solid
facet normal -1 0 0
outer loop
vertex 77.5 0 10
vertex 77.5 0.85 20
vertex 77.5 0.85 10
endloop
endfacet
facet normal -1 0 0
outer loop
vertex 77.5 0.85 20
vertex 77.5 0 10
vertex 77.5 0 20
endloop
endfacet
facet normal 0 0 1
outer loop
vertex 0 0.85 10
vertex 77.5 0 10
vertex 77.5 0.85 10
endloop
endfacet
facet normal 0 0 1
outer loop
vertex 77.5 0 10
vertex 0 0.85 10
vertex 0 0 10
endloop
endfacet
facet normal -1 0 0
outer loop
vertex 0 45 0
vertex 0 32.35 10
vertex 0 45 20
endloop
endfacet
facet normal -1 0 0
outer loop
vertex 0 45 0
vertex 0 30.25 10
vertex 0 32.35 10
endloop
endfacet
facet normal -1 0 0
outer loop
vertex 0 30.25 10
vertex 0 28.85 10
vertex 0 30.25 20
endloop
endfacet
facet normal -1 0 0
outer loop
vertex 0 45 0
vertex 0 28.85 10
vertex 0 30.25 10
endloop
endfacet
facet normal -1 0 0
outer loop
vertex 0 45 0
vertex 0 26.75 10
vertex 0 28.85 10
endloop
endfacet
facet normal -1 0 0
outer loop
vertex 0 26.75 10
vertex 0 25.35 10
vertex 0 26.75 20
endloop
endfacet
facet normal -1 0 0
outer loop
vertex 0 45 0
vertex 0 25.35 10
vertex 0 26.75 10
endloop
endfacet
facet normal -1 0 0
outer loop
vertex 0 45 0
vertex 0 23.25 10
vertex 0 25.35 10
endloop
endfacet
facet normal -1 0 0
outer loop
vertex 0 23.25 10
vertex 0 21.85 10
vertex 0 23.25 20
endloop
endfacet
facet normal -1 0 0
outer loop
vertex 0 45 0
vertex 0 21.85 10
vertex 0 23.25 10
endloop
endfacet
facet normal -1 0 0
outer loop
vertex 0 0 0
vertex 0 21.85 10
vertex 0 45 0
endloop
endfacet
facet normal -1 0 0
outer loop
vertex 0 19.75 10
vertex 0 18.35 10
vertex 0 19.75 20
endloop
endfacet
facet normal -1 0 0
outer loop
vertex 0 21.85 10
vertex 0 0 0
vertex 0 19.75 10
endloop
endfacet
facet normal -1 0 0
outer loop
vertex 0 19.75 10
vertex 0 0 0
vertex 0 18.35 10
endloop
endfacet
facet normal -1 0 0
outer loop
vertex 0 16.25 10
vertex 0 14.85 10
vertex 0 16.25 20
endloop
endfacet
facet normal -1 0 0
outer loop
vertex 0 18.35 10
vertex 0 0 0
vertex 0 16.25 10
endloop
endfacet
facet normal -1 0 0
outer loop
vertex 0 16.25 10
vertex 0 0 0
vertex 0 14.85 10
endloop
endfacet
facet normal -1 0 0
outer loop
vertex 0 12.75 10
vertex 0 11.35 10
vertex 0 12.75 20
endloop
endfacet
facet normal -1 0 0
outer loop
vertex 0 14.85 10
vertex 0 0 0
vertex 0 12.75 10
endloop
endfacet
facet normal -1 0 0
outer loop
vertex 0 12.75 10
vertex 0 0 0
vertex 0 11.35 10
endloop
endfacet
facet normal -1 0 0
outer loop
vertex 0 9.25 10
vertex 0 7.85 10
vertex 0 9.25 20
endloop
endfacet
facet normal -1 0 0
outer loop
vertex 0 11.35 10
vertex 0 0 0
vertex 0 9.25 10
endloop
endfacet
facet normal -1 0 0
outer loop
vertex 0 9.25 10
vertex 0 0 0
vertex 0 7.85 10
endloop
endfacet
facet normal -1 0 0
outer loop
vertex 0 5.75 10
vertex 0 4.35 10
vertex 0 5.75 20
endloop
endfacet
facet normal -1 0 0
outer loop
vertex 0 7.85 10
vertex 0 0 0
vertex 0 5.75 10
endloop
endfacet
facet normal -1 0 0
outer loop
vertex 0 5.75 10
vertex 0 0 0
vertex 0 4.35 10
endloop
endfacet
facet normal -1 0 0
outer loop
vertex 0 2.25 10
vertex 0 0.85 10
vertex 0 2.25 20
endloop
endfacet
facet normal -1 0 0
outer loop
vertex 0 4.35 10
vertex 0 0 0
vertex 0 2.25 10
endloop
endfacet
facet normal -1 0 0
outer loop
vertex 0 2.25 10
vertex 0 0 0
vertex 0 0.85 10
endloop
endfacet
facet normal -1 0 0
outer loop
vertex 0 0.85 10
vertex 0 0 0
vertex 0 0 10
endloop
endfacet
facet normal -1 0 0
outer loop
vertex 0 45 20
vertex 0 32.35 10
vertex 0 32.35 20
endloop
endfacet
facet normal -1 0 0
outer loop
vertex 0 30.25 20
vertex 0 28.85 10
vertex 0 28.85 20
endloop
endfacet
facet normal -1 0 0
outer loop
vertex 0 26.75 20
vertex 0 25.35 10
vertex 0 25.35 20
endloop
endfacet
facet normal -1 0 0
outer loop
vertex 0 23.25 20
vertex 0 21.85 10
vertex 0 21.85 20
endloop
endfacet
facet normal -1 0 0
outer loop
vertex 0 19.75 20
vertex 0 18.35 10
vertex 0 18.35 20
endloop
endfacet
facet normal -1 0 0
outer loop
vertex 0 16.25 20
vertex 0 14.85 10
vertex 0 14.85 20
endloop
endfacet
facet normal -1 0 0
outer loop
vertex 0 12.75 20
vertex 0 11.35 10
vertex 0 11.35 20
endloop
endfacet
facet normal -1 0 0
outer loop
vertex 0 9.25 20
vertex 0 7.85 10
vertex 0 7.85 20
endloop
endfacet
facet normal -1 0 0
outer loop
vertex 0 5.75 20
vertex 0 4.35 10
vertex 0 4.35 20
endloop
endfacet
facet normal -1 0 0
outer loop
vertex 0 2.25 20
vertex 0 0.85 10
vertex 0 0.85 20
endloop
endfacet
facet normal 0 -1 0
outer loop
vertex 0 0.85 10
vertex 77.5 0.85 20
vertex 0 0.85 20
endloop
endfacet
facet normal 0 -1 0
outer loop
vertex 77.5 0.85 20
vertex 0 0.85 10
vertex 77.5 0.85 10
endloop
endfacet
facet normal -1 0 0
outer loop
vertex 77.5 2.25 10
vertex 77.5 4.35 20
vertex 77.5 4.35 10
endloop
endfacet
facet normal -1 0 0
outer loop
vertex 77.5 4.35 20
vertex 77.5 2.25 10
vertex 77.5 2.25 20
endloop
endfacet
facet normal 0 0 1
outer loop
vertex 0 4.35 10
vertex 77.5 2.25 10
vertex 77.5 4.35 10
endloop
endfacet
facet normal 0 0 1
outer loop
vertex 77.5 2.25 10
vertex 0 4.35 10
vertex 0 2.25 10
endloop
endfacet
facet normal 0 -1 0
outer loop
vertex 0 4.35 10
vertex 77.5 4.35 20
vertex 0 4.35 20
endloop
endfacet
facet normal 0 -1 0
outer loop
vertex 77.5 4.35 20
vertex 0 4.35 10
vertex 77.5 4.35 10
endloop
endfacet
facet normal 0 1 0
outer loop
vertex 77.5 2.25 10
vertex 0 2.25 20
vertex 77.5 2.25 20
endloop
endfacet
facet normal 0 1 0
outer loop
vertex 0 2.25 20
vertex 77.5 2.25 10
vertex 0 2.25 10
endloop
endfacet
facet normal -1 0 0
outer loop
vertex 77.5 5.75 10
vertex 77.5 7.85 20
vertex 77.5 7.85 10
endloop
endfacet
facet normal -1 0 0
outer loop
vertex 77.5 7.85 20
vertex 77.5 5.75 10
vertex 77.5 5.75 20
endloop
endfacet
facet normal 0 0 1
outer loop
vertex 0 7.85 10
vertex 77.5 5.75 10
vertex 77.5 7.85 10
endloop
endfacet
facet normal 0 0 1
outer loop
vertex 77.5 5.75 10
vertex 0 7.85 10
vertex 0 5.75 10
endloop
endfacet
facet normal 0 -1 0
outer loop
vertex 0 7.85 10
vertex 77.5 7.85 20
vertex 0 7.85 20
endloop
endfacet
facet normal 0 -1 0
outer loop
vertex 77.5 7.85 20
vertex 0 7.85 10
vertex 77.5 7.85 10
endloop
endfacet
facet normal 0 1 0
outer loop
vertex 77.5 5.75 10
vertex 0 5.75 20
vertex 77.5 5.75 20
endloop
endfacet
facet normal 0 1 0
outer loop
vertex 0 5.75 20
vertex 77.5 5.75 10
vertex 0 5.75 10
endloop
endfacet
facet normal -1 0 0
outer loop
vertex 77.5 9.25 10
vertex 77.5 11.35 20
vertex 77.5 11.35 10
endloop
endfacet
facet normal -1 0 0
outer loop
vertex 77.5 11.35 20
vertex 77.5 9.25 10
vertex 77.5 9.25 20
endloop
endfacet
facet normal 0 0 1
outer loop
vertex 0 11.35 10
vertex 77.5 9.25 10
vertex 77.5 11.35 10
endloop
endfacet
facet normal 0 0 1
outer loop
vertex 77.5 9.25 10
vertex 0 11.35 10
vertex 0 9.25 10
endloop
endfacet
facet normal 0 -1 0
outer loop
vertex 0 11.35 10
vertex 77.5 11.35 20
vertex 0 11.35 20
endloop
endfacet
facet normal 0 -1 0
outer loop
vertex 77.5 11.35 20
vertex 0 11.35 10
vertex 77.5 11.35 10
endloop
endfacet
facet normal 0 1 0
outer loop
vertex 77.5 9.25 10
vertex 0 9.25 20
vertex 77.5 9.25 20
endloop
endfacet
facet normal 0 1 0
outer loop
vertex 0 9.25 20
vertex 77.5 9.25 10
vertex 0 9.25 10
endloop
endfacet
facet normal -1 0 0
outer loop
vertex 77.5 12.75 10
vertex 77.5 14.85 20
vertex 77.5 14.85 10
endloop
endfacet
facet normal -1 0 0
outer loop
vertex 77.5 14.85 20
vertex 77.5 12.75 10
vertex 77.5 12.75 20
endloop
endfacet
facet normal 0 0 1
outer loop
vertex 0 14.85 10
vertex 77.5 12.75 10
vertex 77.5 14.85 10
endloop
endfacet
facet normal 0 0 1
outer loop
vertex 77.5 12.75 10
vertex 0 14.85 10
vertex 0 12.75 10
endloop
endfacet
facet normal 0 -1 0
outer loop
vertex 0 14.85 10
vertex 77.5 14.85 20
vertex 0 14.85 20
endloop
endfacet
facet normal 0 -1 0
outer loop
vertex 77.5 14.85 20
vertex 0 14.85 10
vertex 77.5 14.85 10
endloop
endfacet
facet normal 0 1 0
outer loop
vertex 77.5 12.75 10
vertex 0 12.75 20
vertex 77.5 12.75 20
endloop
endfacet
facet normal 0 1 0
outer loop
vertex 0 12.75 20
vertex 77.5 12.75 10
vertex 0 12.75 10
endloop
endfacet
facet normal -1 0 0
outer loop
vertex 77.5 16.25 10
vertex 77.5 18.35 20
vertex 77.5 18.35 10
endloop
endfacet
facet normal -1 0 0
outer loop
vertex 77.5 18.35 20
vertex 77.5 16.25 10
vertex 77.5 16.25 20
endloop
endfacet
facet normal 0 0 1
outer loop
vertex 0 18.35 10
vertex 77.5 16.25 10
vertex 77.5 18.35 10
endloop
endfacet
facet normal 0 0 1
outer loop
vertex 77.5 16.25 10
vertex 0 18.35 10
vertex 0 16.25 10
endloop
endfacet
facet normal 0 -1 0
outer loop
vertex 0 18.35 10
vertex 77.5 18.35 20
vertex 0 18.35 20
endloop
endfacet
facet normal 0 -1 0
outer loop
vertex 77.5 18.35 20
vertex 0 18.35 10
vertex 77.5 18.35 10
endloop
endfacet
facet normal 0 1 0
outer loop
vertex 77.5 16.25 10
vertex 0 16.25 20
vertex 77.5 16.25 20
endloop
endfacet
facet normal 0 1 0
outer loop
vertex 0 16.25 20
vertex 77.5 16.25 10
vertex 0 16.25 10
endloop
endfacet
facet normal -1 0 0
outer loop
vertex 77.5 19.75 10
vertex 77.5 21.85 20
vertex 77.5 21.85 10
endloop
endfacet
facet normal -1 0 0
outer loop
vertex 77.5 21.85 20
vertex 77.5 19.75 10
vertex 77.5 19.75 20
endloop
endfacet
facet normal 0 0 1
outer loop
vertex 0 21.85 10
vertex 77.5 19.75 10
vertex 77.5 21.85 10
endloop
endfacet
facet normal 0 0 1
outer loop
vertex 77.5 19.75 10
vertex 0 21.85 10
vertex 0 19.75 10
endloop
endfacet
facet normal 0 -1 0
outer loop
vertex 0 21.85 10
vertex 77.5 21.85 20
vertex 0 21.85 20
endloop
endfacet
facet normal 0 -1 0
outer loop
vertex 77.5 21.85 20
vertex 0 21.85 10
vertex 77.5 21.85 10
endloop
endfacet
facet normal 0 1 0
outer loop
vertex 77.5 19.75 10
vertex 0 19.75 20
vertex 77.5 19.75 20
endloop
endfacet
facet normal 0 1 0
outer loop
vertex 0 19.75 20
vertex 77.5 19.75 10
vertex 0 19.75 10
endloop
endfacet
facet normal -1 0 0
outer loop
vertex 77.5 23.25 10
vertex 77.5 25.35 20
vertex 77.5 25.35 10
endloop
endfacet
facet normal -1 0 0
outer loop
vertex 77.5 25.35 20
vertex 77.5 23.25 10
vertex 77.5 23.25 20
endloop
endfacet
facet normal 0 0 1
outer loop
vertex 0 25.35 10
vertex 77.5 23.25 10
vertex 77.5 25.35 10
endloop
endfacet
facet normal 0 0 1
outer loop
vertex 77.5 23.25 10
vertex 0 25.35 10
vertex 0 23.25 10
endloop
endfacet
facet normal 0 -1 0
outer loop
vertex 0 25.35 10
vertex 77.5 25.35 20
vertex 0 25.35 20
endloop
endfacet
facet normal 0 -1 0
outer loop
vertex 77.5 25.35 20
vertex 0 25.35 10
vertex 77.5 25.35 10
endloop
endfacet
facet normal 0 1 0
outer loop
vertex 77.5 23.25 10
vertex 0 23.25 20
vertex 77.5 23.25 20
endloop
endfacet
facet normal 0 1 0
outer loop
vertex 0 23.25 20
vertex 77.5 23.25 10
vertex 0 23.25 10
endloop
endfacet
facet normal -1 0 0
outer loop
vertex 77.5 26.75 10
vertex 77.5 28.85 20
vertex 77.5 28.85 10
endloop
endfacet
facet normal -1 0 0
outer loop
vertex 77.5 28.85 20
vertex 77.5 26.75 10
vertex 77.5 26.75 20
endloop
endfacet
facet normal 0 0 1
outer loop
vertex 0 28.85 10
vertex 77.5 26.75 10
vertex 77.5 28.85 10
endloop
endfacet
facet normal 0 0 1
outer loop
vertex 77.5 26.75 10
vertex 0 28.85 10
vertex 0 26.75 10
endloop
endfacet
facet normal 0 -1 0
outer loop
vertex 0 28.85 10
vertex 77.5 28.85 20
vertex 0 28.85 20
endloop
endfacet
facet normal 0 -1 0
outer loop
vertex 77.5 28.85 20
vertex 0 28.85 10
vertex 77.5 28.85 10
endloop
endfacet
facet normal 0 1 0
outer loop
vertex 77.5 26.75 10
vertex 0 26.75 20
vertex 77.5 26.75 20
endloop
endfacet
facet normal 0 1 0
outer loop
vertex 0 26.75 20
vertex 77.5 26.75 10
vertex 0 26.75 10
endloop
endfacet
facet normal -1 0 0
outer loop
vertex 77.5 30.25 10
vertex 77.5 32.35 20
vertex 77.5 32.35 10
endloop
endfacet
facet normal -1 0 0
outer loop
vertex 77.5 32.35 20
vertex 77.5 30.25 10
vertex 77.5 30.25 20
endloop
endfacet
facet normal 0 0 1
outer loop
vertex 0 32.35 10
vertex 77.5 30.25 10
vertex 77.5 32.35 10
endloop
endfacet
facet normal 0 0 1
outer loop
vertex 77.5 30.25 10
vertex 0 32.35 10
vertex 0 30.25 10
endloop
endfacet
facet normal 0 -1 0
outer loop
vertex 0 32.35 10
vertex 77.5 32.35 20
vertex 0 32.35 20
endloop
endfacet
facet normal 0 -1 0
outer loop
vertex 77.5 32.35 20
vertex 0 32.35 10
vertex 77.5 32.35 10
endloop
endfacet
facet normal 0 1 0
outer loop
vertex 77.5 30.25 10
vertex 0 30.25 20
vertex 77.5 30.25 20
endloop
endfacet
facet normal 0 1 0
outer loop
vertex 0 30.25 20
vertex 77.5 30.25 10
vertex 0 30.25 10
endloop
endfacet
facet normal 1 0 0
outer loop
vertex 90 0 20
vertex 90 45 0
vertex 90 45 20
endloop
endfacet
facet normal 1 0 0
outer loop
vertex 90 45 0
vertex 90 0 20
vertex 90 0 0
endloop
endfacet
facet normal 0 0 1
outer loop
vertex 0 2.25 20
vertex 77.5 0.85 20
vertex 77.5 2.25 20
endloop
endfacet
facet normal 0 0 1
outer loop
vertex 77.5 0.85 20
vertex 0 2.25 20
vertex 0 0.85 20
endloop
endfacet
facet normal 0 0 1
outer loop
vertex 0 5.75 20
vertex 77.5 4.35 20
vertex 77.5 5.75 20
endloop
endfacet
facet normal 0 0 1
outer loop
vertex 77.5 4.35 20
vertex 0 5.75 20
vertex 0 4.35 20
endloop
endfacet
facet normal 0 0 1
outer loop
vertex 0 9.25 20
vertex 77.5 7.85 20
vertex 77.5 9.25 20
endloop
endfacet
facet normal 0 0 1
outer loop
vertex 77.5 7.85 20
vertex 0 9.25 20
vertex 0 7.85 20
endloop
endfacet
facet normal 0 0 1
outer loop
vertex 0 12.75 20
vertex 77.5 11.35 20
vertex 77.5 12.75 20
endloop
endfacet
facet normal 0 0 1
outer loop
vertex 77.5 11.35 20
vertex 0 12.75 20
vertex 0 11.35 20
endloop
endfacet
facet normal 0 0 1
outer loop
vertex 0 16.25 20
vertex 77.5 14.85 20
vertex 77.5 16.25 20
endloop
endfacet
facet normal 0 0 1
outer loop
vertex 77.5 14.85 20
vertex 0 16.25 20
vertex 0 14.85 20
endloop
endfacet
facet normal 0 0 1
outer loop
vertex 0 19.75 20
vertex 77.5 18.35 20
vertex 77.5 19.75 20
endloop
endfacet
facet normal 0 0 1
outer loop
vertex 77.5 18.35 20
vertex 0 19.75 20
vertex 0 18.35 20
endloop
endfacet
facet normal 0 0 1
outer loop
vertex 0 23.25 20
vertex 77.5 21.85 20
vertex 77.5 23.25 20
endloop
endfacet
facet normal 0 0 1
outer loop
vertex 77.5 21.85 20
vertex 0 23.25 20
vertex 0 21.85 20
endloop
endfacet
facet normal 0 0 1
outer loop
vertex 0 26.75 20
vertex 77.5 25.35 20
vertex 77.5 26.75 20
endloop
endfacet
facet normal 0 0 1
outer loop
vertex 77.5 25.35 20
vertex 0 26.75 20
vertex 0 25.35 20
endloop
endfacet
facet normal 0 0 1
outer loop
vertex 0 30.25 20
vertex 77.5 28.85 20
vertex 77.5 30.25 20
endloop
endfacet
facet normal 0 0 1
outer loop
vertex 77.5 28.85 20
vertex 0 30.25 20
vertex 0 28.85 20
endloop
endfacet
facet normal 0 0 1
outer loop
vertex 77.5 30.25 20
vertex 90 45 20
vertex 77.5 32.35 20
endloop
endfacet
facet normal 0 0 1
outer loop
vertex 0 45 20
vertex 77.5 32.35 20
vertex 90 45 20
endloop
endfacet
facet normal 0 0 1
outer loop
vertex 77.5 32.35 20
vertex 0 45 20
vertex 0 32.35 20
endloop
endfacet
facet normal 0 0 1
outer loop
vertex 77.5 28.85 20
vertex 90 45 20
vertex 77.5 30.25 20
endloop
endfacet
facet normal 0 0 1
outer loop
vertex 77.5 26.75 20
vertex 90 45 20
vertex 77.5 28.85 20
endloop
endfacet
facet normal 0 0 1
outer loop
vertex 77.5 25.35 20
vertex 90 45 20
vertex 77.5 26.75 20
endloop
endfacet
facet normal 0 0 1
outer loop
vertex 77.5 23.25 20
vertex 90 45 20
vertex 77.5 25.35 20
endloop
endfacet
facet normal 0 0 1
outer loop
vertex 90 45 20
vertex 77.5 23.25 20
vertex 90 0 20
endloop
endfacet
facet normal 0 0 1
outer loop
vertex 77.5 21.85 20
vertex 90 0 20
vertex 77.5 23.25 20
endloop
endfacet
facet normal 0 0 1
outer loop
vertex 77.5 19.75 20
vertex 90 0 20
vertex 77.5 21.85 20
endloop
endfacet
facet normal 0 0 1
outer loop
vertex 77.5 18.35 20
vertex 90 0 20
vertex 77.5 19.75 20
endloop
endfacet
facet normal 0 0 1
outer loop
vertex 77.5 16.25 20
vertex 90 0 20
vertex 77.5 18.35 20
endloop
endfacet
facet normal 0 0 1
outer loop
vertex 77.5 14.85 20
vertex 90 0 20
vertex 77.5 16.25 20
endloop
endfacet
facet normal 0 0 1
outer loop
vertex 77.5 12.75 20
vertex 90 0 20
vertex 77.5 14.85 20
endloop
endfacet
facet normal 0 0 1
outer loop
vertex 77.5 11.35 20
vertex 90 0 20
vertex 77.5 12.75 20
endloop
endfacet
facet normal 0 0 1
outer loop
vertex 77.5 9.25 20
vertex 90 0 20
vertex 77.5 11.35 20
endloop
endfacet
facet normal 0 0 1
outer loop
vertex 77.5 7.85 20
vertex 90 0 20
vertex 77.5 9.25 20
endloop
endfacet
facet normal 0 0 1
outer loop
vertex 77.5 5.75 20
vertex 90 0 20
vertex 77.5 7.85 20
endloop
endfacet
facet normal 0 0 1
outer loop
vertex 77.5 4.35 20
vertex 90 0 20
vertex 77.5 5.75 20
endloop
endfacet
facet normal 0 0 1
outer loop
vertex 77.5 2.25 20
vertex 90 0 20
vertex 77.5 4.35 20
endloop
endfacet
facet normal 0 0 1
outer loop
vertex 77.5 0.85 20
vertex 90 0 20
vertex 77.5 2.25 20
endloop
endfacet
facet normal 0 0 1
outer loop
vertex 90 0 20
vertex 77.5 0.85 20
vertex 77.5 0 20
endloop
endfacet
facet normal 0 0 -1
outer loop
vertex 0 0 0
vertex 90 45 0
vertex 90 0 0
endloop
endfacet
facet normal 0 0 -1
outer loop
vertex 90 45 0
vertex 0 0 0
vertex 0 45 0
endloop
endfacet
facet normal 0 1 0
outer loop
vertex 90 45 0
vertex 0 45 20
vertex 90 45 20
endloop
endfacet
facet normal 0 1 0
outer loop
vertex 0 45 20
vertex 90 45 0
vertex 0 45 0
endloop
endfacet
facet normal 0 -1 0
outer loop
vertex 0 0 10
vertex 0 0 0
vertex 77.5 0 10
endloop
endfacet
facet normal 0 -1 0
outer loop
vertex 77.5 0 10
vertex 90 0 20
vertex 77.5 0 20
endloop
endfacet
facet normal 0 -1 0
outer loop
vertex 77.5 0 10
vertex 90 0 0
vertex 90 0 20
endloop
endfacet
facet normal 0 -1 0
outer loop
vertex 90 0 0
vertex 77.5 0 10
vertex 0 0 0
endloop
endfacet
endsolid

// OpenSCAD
// Drying Rack for 10 Microscope Slides
// Base: 90 x 45 x 20 mm
// Slots: 10 parallel slots, 77mm long, 1.6mm wide, 10mm deep
// Spacing: 3.5mm centre-to-centre (Y)
// Orientation: Rests on XY plane at Z=0, builds upward (+Z)

// Base Dimensions
$base_length = 90;
$base_width = 45;
$base_height = 20;

// Slide Dimensions (for reference)
$slide_length = 75;
$slide_width = 25;
$slide_thickness = 1;

// Slot Dimensions
$num_slots = 10;
$slot_length = 77;
$slot_width = 1.6;
$slot_depth = 10;
$slot_spacing = 3.5; // Centre-to-centre in Y

// Extrusion quality for curved/rounded features
$fn = 64;

// --- Main Block ---
difference() {
    // Create the solid base block
    translate([0, 0, 0])
        cube([
            $base_length,
            $base_width,
            $base_height
        ]);

    // Cut 10 parallel slots
    // Slots run along X, so we cut boxes oriented along X.
    // The cut shape extends slightly past the slot length to ensure clean removal.
    $cut_extension = 0.5; 
    
    // Calculate the total span of the slots to center them correctly
    // Total span = (num_slots * slot_width) + ((num_slots - 1) * slot_spacing)
    $total_slot_span = ($num_slots * $slot_width) + (($num_slots - 1) * $slot_spacing);
    
    // Calculate the offset needed to center the group of slots on the block width
    // Block half-width = 45 / 2 = 22.5
    // Group half-span = total_slot_span / 2
    $y_center_offset = ($base_width / 2) - ($total_slot_span / 2);

    for (i = [0 : $num_slots - 1]) {
        // Calculate Y position for the centre of the slot
        // Start at the calculated center offset and add increments of spacing
        $slot_y = $y_center_offset + (i * $slot_spacing);
        
        // Define the cutting shape (Box)
        // Length along X: slot_length + extension
        // Width along Y: slot_width + extension (to ensure full cut)
        // Height along Z: slot_depth + extension (to ensure full cut)
        $cut_length = $slot_length + $cut_extension;
        $cut_width = $slot_width + $cut_extension;
        $cut_height = $slot_depth + $cut_extension;
        
        // Position the cut:
        // X: 0 (centred)
        // Y: calculated slot_y
        // Z: Top of block ($base_height) minus the depth of the cut.
        //    This places the cut starting at the top face and going down.
        translate([
            0,              // X is centred
            $slot_y,        // Y position
            $base_height - $slot_depth // Z position: start at top face and go down
        ])
            cube([
                $cut_length,
                $cut_width,
                $cut_height
            ]);
    }
}
